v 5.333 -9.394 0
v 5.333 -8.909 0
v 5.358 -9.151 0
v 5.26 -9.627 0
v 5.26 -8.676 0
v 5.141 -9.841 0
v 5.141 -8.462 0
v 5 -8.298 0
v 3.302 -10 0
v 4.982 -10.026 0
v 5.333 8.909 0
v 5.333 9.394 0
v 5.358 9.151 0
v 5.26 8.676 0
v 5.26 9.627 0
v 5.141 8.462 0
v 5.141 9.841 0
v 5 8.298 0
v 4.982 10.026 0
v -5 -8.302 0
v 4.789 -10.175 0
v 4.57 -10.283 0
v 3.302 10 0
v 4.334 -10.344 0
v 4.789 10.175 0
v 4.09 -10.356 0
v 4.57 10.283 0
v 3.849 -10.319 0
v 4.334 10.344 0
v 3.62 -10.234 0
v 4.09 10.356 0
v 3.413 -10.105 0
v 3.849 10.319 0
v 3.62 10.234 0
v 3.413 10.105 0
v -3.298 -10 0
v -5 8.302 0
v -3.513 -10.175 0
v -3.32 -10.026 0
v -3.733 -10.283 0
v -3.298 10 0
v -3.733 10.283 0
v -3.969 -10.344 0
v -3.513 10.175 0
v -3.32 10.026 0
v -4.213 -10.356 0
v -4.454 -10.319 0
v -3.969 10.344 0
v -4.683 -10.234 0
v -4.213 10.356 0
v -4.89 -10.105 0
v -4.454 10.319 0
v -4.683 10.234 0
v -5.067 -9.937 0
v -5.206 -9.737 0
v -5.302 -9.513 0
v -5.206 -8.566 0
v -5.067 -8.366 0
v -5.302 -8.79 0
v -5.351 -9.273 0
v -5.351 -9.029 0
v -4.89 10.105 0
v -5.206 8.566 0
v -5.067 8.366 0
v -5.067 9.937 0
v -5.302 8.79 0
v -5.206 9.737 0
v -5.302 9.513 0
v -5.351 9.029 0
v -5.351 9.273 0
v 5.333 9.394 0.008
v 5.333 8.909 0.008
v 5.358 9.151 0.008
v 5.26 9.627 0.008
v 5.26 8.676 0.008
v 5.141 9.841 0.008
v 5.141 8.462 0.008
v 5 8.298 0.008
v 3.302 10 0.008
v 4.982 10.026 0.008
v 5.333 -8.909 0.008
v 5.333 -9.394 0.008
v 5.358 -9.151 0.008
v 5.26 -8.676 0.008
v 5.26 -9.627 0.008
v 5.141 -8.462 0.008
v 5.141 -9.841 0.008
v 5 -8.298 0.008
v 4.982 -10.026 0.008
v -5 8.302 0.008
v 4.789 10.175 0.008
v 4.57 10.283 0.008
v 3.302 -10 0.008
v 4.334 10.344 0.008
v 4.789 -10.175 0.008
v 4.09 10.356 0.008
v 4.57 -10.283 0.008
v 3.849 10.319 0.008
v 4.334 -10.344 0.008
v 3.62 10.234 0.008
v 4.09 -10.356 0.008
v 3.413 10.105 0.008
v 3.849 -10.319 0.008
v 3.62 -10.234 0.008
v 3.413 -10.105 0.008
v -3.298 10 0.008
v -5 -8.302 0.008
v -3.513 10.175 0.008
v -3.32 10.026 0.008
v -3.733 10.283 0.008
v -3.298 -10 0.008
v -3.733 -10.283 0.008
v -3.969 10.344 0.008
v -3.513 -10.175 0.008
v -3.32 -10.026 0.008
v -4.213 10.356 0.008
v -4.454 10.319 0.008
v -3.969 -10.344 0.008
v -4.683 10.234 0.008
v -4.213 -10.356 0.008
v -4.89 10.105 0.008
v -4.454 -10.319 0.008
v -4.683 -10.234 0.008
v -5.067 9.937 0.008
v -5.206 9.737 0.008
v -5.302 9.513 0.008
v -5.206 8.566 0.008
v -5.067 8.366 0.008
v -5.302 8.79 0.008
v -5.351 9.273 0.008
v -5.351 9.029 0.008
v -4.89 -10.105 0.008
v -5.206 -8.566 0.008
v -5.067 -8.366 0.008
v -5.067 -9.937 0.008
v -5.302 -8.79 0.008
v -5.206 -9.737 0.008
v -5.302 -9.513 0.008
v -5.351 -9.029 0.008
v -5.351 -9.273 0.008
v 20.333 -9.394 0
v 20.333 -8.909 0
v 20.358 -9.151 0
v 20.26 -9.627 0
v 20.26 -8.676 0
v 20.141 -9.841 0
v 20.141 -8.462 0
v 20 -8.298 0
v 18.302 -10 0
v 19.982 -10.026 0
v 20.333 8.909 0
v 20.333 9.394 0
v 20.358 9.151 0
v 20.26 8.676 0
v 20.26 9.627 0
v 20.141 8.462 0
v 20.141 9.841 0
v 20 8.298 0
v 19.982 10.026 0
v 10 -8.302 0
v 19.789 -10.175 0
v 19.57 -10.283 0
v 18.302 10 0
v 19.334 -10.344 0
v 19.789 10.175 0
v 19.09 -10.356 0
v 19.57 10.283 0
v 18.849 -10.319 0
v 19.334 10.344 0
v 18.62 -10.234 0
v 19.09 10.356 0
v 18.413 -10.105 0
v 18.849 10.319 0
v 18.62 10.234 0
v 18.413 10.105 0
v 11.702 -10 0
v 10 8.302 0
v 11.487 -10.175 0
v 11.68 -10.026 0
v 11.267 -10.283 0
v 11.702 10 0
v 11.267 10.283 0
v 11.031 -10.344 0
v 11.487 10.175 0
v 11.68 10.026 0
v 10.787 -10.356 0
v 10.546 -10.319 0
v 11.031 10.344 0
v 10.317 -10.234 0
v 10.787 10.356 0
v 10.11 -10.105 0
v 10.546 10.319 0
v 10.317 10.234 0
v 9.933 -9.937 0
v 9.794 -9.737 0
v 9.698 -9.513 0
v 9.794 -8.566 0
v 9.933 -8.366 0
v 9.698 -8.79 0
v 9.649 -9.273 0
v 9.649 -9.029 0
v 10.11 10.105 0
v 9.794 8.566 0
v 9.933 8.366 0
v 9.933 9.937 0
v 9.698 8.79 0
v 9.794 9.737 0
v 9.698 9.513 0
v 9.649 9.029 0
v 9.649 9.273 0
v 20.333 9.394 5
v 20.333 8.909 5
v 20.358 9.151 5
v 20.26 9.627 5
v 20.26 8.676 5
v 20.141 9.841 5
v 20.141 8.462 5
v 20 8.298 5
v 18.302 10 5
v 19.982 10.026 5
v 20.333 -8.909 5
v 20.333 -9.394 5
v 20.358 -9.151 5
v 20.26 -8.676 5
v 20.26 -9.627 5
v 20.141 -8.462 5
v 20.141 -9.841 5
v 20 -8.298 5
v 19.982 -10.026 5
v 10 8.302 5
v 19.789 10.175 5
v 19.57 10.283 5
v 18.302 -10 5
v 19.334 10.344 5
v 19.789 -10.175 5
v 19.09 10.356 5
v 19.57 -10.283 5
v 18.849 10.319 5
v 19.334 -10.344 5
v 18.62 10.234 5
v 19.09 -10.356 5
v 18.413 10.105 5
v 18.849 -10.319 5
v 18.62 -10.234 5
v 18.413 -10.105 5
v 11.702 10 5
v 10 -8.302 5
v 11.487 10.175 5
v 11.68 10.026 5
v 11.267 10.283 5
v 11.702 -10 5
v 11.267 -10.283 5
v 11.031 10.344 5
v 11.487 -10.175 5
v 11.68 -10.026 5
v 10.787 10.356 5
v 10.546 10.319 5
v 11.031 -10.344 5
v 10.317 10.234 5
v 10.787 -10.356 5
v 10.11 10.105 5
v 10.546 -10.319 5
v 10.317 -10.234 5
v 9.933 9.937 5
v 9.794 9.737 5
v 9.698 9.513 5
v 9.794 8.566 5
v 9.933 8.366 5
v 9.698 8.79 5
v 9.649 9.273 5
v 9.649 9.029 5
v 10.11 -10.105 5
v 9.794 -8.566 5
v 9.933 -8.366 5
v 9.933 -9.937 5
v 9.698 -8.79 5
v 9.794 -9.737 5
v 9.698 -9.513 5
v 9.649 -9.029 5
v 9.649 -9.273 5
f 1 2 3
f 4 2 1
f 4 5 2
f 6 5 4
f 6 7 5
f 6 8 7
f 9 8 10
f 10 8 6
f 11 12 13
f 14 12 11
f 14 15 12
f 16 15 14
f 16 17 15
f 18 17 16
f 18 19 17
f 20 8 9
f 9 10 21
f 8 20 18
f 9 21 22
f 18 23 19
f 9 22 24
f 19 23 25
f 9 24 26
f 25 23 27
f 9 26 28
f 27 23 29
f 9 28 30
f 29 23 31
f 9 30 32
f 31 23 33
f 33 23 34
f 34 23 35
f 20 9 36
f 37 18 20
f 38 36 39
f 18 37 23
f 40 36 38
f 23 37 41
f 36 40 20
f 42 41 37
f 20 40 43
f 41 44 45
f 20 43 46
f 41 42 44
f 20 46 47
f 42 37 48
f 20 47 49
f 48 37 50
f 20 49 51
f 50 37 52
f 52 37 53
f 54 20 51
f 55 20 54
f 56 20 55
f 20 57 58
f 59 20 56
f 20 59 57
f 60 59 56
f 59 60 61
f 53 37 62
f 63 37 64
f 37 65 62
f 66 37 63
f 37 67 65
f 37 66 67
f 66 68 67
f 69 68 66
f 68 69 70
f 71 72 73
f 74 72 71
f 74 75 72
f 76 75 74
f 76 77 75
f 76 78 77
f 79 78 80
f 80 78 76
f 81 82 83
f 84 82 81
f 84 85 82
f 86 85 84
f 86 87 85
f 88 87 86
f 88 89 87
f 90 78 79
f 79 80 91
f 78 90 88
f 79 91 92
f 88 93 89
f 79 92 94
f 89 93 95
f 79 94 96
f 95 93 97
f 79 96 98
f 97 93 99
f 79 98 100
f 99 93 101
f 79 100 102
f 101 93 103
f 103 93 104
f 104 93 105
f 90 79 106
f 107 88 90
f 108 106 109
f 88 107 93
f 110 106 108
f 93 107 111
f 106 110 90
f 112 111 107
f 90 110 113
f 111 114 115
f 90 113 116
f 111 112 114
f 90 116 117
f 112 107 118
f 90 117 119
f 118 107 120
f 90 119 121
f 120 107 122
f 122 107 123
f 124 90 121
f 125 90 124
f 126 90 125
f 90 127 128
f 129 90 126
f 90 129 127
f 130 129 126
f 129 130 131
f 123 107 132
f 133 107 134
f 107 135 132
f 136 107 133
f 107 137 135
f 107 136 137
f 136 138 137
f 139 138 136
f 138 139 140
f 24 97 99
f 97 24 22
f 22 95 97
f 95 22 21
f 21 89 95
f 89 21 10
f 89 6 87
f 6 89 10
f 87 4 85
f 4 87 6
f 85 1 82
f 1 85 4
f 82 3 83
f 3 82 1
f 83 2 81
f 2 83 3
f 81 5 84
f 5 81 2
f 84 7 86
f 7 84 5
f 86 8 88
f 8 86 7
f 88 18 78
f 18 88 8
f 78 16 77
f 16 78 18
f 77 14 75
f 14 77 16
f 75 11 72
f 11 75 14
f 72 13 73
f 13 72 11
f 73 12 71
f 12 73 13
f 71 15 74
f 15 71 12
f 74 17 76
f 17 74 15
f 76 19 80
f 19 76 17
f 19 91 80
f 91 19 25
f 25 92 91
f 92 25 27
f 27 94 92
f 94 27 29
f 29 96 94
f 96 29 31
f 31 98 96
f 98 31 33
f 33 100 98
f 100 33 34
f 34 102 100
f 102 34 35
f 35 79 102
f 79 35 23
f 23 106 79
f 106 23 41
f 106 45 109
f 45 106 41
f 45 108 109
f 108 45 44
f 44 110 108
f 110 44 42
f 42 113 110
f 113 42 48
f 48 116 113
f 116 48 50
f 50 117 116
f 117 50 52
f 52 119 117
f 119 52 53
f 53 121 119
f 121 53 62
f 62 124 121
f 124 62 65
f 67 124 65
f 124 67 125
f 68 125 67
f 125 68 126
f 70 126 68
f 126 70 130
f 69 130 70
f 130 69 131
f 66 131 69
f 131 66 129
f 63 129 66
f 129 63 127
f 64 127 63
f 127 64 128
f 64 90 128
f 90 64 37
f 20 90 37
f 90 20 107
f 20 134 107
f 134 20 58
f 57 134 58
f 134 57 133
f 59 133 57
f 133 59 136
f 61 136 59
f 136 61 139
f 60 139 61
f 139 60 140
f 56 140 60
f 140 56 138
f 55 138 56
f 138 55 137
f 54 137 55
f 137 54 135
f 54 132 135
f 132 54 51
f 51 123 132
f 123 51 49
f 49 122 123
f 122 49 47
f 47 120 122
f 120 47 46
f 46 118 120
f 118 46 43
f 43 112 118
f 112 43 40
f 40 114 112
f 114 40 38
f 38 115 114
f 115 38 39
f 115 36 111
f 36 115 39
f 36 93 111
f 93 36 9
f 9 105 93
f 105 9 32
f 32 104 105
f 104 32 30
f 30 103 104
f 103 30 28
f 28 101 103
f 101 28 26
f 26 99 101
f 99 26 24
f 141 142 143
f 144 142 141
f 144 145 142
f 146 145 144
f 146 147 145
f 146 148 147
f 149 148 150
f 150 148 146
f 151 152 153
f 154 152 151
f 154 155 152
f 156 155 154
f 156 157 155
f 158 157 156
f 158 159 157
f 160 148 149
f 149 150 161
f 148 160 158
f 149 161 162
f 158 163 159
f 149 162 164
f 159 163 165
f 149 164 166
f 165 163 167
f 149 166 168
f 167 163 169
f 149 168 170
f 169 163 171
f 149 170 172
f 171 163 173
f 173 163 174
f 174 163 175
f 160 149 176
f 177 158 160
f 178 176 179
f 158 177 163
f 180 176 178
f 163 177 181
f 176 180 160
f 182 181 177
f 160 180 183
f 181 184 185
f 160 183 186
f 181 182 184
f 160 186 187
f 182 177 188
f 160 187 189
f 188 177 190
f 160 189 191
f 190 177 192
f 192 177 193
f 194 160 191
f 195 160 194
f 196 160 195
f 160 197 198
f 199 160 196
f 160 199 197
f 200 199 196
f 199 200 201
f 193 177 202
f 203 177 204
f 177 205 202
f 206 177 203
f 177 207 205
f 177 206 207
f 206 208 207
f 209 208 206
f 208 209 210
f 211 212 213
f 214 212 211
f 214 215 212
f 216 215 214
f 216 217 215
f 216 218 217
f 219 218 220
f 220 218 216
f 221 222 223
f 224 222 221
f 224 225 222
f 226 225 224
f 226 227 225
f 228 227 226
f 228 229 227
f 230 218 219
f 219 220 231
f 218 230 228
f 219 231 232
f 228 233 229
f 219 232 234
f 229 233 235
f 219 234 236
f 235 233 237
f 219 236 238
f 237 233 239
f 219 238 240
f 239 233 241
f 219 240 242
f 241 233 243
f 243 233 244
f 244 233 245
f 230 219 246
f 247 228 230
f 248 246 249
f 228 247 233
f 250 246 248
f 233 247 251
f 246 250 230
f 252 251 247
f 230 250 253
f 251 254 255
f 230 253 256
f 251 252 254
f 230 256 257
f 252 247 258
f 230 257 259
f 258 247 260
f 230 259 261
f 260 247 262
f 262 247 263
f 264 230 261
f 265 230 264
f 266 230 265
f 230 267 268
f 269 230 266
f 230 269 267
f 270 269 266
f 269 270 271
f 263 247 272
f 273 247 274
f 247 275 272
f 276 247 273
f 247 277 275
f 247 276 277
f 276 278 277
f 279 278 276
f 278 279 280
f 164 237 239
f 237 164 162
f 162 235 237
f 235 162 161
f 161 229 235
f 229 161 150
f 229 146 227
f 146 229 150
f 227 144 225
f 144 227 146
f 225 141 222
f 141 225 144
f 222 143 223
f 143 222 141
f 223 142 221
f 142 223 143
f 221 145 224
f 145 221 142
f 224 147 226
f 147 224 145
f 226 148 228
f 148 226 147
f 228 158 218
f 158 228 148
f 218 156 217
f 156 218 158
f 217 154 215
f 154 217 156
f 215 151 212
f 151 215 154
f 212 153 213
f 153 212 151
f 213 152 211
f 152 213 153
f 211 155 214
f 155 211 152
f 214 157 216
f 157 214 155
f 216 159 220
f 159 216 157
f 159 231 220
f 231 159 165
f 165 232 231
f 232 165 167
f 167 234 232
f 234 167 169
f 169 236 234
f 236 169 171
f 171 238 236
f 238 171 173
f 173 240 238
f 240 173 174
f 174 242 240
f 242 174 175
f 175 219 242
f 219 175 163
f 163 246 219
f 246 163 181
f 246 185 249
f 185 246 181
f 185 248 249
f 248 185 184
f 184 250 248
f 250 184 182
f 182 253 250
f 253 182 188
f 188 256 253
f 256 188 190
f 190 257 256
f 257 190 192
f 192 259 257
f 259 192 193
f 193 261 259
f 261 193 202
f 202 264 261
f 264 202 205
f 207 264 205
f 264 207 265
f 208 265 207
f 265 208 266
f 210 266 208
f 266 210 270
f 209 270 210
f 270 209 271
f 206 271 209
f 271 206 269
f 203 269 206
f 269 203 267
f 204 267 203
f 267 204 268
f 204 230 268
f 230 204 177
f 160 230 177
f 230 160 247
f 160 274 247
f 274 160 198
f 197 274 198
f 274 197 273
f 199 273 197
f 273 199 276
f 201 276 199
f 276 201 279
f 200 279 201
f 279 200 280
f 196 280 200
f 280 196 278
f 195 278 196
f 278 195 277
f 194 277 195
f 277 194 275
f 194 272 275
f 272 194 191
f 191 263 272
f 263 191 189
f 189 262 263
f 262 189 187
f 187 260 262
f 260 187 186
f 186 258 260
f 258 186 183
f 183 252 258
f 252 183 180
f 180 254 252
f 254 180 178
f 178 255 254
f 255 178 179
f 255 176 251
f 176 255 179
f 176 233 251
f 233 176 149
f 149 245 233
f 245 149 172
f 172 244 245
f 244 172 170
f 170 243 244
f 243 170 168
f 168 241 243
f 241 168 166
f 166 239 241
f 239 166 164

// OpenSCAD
// file: ../utils/core/clip.scad
//
// NopSCADlib Copyright Chris Palmer 2018
// nop.head@gmail.com
// hydraraptor.blogspot.com
//
// This file is part of NopSCADlib.
//
// NopSCADlib is free software: you can redistribute it and/or modify it under the terms of the
// GNU General Public License as published by the Free Software Foundation, either version 3 of
// the License, or (at your option) any later version.
//
// NopSCADlib is distributed in the hope that it will be useful, but WITHOUT ANY WARRANTY;
// without even the implied warranty of MERCHANTABILITY or FITNESS FOR A PARTICULAR PURPOSE.
// See the GNU General Public License for more details.
//
// You should have received a copy of the GNU General Public License along with NopSCADlib.
// If not, see <https://www.gnu.org/licenses/>.
//

//
//! Construct arbirarily large box to partition 3D space and clip objects, useful for creating cross sections to see the inside when debugging.
//!
//! Original version by Doug Moen on the OpenSCAD forum
//
//
module box(xmin, ymin, zmin, xmax, ymax, zmax) //! Construct a box given its bounds
    polyhedron(
        [[xmin, ymin, zmin],  // 0
         [xmin, ymin, zmax],  // 1
         [xmin, ymax, zmin],  // 2
         [xmin, ymax, zmax],  // 3
         [xmax, ymin, zmin],  // 4
         [xmax, ymin, zmax],  // 5
         [xmax, ymax, zmin],  // 6
         [xmax, ymax, zmax]], // 7
        [[7,5,1,3],  // top
         [2,0,4,6],  // bottom
         [5,4,0,1],  // front
         [3,2,6,7],  // back
         [5,7,6,4],  // right
         [0,2,3,1]]  // left
    );

module clip(xmin = -inf, ymin = -inf, zmin = -inf, xmax = inf, ymax = inf, zmax = inf) //! Clip child to specified boundaries
    render() intersection() {
        children();

        box(xmin, ymin, zmin, xmax, ymax, zmax);
    }
// file: ../utils/core/rounded_rectangle.scad
//
// NopSCADlib Copyright Chris Palmer 2018
// nop.head@gmail.com
// hydraraptor.blogspot.com
//
// This file is part of NopSCADlib.
//
// NopSCADlib is free software: you can redistribute it and/or modify it under the terms of the
// GNU General Public License as published by the Free Software Foundation, either version 3 of
// the License, or (at your option) any later version.
//
// NopSCADlib is distributed in the hope that it will be useful, but WITHOUT ANY WARRANTY;
// without even the implied warranty of MERCHANTABILITY or FITNESS FOR A PARTICULAR PURPOSE.
// See the GNU General Public License for more details.
//
// You should have received a copy of the GNU General Public License along with NopSCADlib.
// If not, see <https://www.gnu.org/licenses/>.
//

//
//! Rectangle with rounded corners.
//
module rounded_square(size, r, center = true) //! Like ```square()``` but with with rounded corners
{
    $fn = r2sides4n(r);
    offset(r) offset(-r) square(size, center = center);
}

module rounded_rectangle(size, r, center = true, xy_center = true) //! Like ```cube()``` but corners rounded in XY plane and separate centre options for xy and z.
{
    linear_extrude(size[2], center = center)
        rounded_square([size[0], size[1]], r, xy_center);
}
// file: ../utils/core/teardrops.scad
//
// NopSCADlib Copyright Chris Palmer 2018
// nop.head@gmail.com
// hydraraptor.blogspot.com
//
// This file is part of NopSCADlib.
//
// NopSCADlib is free software: you can redistribute it and/or modify it under the terms of the
// GNU General Public License as published by the Free Software Foundation, either version 3 of
// the License, or (at your option) any later version.
//
// NopSCADlib is distributed in the hope that it will be useful, but WITHOUT ANY WARRANTY;
// without even the implied warranty of MERCHANTABILITY or FITNESS FOR A PARTICULAR PURPOSE.
// See the GNU General Public License for more details.
//
// You should have received a copy of the GNU General Public License along with NopSCADlib.
// If not, see <https://www.gnu.org/licenses/>.
//

//
//! For making horizontal holes that don't need support material.
//! Small holes can get away without it, but they print better with truncated teardrops.
//
module teardrop(h, r, center = true, truncate = true, chamfer = 0) { //! For making horizontal holes that don't need support material, set ```truncate = false``` to make traditional RepRap teardrops that don't even need bridging
    module teardrop_2d(r, truncate) {
        hull() {
            circle4n(r);
            if(truncate)
                translate([0, r / 2])
                    square([2 * r * (sqrt(2) - 1), r], center = true);
            else
                polygon([[0, 0], [eps, 0], [0, r * sqrt(2)]]);
        }
    }

    render(convexity = 5)
        extrude_if(h, center)
            teardrop_2d(r, truncate);

    teardrop_chamfer(h, center, chamfer) {
        linear_extrude(eps, center = true)
            teardrop_2d(r + chamfer / 2, truncate);
        translate_z(-chamfer / 2)
            linear_extrude(eps, center = true)
                teardrop_2d(r, truncate);
    }
}

module semi_teardrop(h, r, d = undef, center = true, chamfer = 0) { //! A semi teardrop in the positive Y domain
    module semi_teardrop_2d(r, d) {
        intersection() {
            R = is_undef(d) ? r : d / 2;
            teardrop(r = R, h = 0);

            sq = R + 1;
            translate([-sq, 0])
                square([2 * sq, sq]);
        }
    }

    render(convexity = 5)
        extrude_if(h, center)
            semi_teardrop_2d(r, d);

    teardrop_chamfer(h, center, chamfer) {
        linear_extrude(eps, center = true)
            semi_teardrop_2d(r + chamfer / 2, d);
        translate_z(-chamfer / 2)
            linear_extrude(eps, center = true)
                semi_teardrop_2d(r, d);
    }
}

module teardrop_plus(h, r, center = true, truncate = true, chamfer = 0) //! Slightly bigger teardrop to allow for the 3D printing staircase effect
    teardrop(h, r + layer_height / 4, center, truncate, chamfer);

module tearslot(h, r, w, center = true, chamfer = 0) { //! A horizontal slot that doesn't need support material
    module tearslot_2d(r, w) {
        hull() {
            translate([-w / 2, 0]) teardrop(r = r, h = 0);
            translate([w / 2, 0]) teardrop(r = r, h = 0);
        }
    }

    extrude_if(h, center)
        tearslot_2d(r, w);

    teardrop_chamfer(h, center, chamfer) {
        linear_extrude(eps, center = true)
            tearslot_2d(r + chamfer / 2, w);
        translate_z(-chamfer / 2)
            linear_extrude(eps, center = true)
                tearslot_2d(r, w);
    }
}

module vertical_tearslot(h, r, l, center = true, chamfer = 0) { //! A vertical slot that doesn't need support material
    module vertical_tearslot_2d(r, l) {
        hull() {
            translate([0,  l / 2]) teardrop(0, r, true);
            translate([0, -l / 2]) circle4n(r);
        }
    }

    extrude_if(h, center)
        vertical_tearslot_2d(r, l);

    teardrop_chamfer(h, center, chamfer) {
        linear_extrude(eps, center = true)
            vertical_tearslot_2d(r + chamfer / 2, l);
        translate_z(-chamfer / 2)
            linear_extrude(eps, center = true)
                vertical_tearslot_2d(r, l);
    }
}

module teardrop_chamfer(h, center, chamfer) { //! Helper module for adding chamfer to a teardrop
    if(h && chamfer)
        translate_z(center ? 0 : h / 2)
            for(m = [0, 1])
                mirror([0, 0, m])
                    translate_z((h - eps ) / 2)
                        hull()
                            children();
}
// file: ../utils/core/polyholes.scad
//
// NopSCADlib Copyright Chris Palmer 2018
// nop.head@gmail.com
// hydraraptor.blogspot.com
//
// This file is part of NopSCADlib.
//
// NopSCADlib is free software: you can redistribute it and/or modify it under the terms of the
// GNU General Public License as published by the Free Software Foundation, either version 3 of
// the License, or (at your option) any later version.
//
// NopSCADlib is distributed in the hope that it will be useful, but WITHOUT ANY WARRANTY;
// without even the implied warranty of MERCHANTABILITY or FITNESS FOR A PARTICULAR PURPOSE.
// See the GNU General Public License for more details.
//
// You should have received a copy of the GNU General Public License along with NopSCADlib.
// If not, see <https://www.gnu.org/licenses/>.
//

//
//! A method of making 3D printed holes come out the right size regardless of the printer, providing
//! it gets the linear dimensions right. See <https://hydraraptor.blogspot.com/2011/02/polyholes.html>
//!
//! The module provides `poly_circle()`, `poly_cylinder()` and `poly_ring()` that is useful for making printed washers and pillars.
//
function sides(r) = max(round(4 * r), 3);                                       //! Optimium number of sides for specified radius
function corrected_radius(r, n = 0)   = r / cos(180 / (n ? n : sides(r)));      //! Adjusted radius to make flats lie on the circle
function corrected_diameter(d, n = 0) = d / cos(180 / (n ? n : sides(d / 2)));  //! Adjusted diameter to make flats lie on the circle

module poly_circle(r, sides = 0) { //! Make a circle adjusted to print the correct size
    n = sides ? sides : sides(r);
    circle(r = corrected_radius(r,n), $fn = n);
}

module poly_cylinder(r, h, center = false, sides = 0) //! Make a cylinder adjusted to print the correct size
    extrude_if(h, center)
        poly_circle(r, sides);

module poly_ring(or, ir) { //! Make a 2D ring adjusted to have the correct internal radius
    cir = corrected_radius(ir);
    filaments = (or - cir) / extrusion_width;
    if(filaments > 3 + eps)
        difference() {
            circle(or);

            poly_circle(ir);
        }
    else
        if(filaments >= 2)
            difference() {
                offset(or - cir)
                    poly_circle(ir);

                poly_circle(ir);
            }
            else
                difference() {
                    poly_circle(or);

                    offset(-squeezed_wall)
                        poly_circle(or);
                }
}

module poly_tube(or, ir, h, center = false) //! Make a tube adjusted to have the correct internal radius
    extrude_if(h, center)
        poly_ring(or, ir);

module drill(r, h = 100) //! Make a cylinder for drilling holes suitable for CNC routing, set h = 0 for circle
    extrude_if(h)
        circle(r = corrected_radius(r, r2sides(r)));
//
// Horizontal slot
//
module slot(r, l, h = 100) //! Make a horizontal slot suitable for CNC routing, set h = 0 for 2D version
    extrude_if(h)
        hull() {
            translate([l / 2,0])
                drill(r, 0);

            translate([-l / 2,0])
                drill(r, 0);
        }
// file: ../utils/core/bom.scad
//
// NopSCADlib Copyright Chris Palmer 2018
// nop.head@gmail.com
// hydraraptor.blogspot.com
//
// This file is part of NopSCADlib.
//
// NopSCADlib is free software: you can redistribute it and/or modify it under the terms of the
// GNU General Public License as published by the Free Software Foundation, either version 3 of
// the License, or (at your option) any later version.
//
// NopSCADlib is distributed in the hope that it will be useful, but WITHOUT ANY WARRANTY;
// without even the implied warranty of MERCHANTABILITY or FITNESS FOR A PARTICULAR PURPOSE.
// See the GNU General Public License for more details.
//
// You should have received a copy of the GNU General Public License along with NopSCADlib.
// If not, see <https://www.gnu.org/licenses/>.
//

//
//! Bill Of Materials generation via echo and the ```bom.py``` script. Also handles exploded assembly views and posing. Assembly instructions can precede the module
//! definition that makes the assembly.
//!
//! The example below shows how to define a vitamin and incorporate it into an assembly with sub-assemblies and make an exploded view. The resulting flat BOM is shown but
//! heirachical BOMs are also generated for real projects.
//
function bom_mode(n = 1) = $_bom >= n && (is_undef($on_bom) || $on_bom);  //! Current BOM mode, 0 = none, 1 = printed and routed parts and assemblies, 2 includes vitamins as well
function exploded() = is_undef($exploded_parent) ? $exploded : 0;   //! Returns the value of ```$exploded``` if it is defined, else ```0```
function show_supports() = !$preview || exploded();                 //! True if printed support material should be shown

module no_explode() let($exploded_parent = true) children();        //! Prevent children being exploded
module no_pose() let($posed = true) children();                     //! Force children not to be posed even if parent is

module explode(d, explode_children = false, offset = [0,0,0]) {     //! Explode children by specified Z distance or vector ```d```, option to explode grand children
    v = is_list(d) ? d : [0, 0, d];
    o = is_list(offset) ? offset : [0, 0, offset];
    if($exploded && is_undef($exploded_parent) && norm(v)) {
        translate(o)                                                // Draw the line first in case the child is transparent
            color("yellow") hull() {
                sphere(0.2);

                translate(v * $exploded)
                    sphere(0.2);
            }

        translate(v * $exploded)
            let($exploded_parent = explode_children ? undef : true)
                children();
    }
    else
        children();
}

module pose(a = [55, 0, 25], t = [0, 0, 0], exploded = undef)       //! Pose an STL or assembly for rendering to png by specifying rotation ```a``` and translation ```t```, ```exploded = true for``` just the exploded view or ```false``` for unexploded only.
    if(is_undef($pose) || !is_undef($posed) || (!is_undef(exploded) && exploded != !!exploded()))
        children();
    else
        let($posed = true) // only pose the top level
            rotate([55, 0, 25])
                rotate([-a.x, 0, 0])
                    rotate([0, -a.y, 0])
                        rotate([0, 0, -a.z])
                            translate(-t)
                                children();

module pose_hflip(exploded = undef)       //! Pose an STL or assembly for rendering to png by flipping around the Y axis, ```exploded = true for``` just the exploded view or ```false``` for unexploded only.
    if(is_undef($pose) || !is_undef($posed) || (!is_undef(exploded) && exploded != !!exploded()))
        children();
    else
        let($posed = true) // only pose the top level
            hflip()
                children();

module pose_vflip(exploded = undef)       //! Pose an STL or assembly for rendering to png by flipping around the X axis, ```exploded = true for``` just the exploded view or ```false``` for unexploded only.
    if(is_undef($pose) || !is_undef($posed) || (!is_undef(exploded) && exploded != !!exploded()))
        children();
    else
        let($posed = true) // only pose the top level
            vflip()
                children();


module assembly(name) {                 //! Name an assembly that will appear on the BOM, there needs to a module named ```<name>_assembly``` to make it
    if(bom_mode())
        echo(str("~", name, "_assembly{"));

    no_pose()
        if(is_undef($child_assembly))
            let($child_assembly = true)
                children();
        else
            no_explode()
                children();

    if(bom_mode())
        echo(str("~}", name, "_assembly"));
}

module stl(name) {                      //! Name an stl that will appear on the BOM, there needs to a module named ```<name>_stl``` to make it
    if(bom_mode())
        echo(str("~", name, ".stl"));
}

module dxf(name) {                      //! Name a dxf that will appear on the BOM, there needs to a module named ```<name>_dxf``` to make it
    if(bom_mode())
        echo(str("~", name, ".dxf"));
}

function value_string(value) = is_string(value) ? str("\"", value, "\"") : str(value); //! Convert ```value``` to a string or quote it if it is already a string

function arg(value, default, name = "") =   //! Create string for arg if not default, helper for ```vitamin()```
    value == default ? ""
                     : name ? str(", ", name, " = ", value_string(value))
                            : str(", ", value_string(value));

module vitamin(description) {                //! Describe a vitamin for the BOM entry and precede it with a module call that creates it, eg. "wigit(42): Type 42 widget"
    if(bom_mode(2))
        echo(str("~", description, !is_undef($hidden) ? " - not shown" : ""));
}

module not_on_bom(on = false)               //! Specify the following child parts are not on the BOM, for example when they are on a PCB that comes assembled
    let($on_bom = on)
        children();

module hidden()                             //! Make item invisible, except on the BOM
    scale(1 / sqr(1024))
        let($hidden = true)
            children();
// file: ../utils/core/sphere.scad
//
// NopSCADlib Copyright Chris Palmer 2018
// nop.head@gmail.com
// hydraraptor.blogspot.com
//
// This file is part of NopSCADlib.
//
// NopSCADlib is free software: you can redistribute it and/or modify it under the terms of the
// GNU General Public License as published by the Free Software Foundation, either version 3 of
// the License, or (at your option) any later version.
//
// NopSCADlib is distributed in the hope that it will be useful, but WITHOUT ANY WARRANTY;
// without even the implied warranty of MERCHANTABILITY or FITNESS FOR A PARTICULAR PURPOSE.
// See the GNU General Public License for more details.
//
// You should have received a copy of the GNU General Public License along with NopSCADlib.
// If not, see <https://www.gnu.org/licenses/>.
//

//! Redefines `sphere()` to always have a vertex on all six half axes I.e. vertices at the poles and the equator and `$fn` a multiple of four.
//! This ensures `hull` and `minkowski` results have the correct dimensions when spheres are placed at the corners.

module sphere(r = 1, d = undef) {                   //! Override ```sphere``` so that has vertices on all three axes. Has the advantage of giving correct dimensions when hulled
    R = is_undef(d) ? r : d / 2;
    rotate_extrude($fn = r2sides4n(R))
        rotate(-90)
            semi_circle(R);
}
// file: ../utils/core/global.scad
//
// NopSCADlib Copyright Chris Palmer 2018
// nop.head@gmail.com
// hydraraptor.blogspot.com
//
// This file is part of NopSCADlib.
//
// NopSCADlib is free software: you can redistribute it and/or modify it under the terms of the
// GNU General Public License as published by the Free Software Foundation, either version 3 of
// the License, or (at your option) any later version.
//
// NopSCADlib is distributed in the hope that it will be useful, but WITHOUT ANY WARRANTY;
// without even the implied warranty of MERCHANTABILITY or FITNESS FOR A PARTICULAR PURPOSE.
// See the GNU General Public License for more details.
//
// You should have received a copy of the GNU General Public License along with NopSCADlib.
// If not, see <https://www.gnu.org/licenses/>.
//

//
//! Global constants, functions and modules. This file is used directly or indirectly in every scad file.
//
include <../../global_defs.scad>

function inch(x) = x * 25.4;                                                        //! Inch to mm conversion (For fractional inches, 'inch(1 + 7/8)' will work as expected.)
function foot(x) = x * 25.4 * 12;                                                   //! Foot to mm conversion
function yard(x) = x * 25.4 * 12 * 3;                                               //! Yard to mm conversion
function mm(x)   = x;                                                               //! Explicit mm specified
function cm(x)   = x * 10.0;                                                        //! cm to mm conversion
function m(x)    = x * 1000.0;                                                      //! m to mm conversion

function sqr(x) = x * x;                                                            //! Returns the square of ```x```
function echoit(x) = echo(x) x;                                                     //! Echo expression and return it, useful for debugging
function in(list, x) = !!len([for(v = list) if(v == x) true]);                      //! Returns true if ```x``` is an element in the ```list```
function Len(x) = is_list(x) ? len(x) : 0;                                          //! Returns the length of a list or 0 if ```x``` is not a list
function r2sides(r) = $fn ? $fn : ceil(max(min(360/ $fa, r * 2 * PI / $fs), 5));    //! Replicates the OpenSCAD logic to calculate the number of sides from the radius
function r2sides4n(r) = floor((r2sides(r) + 3) / 4) * 4;                            //! Round up the number of sides to a multiple of 4 to ensure points land on all axes

module translate_z(z) translate([0, 0, z]) children();                              //! Shortcut for Z only translations
module vflip() rotate([180, 0, 0]) children();                                      //! Invert children by doing a 180&deg; flip around the X axis
module hflip() rotate([0, 180, 0]) children();                                      //! Invert children by doing a 180&deg; flip around the Y axis
module ellipse(xr, yr) scale([1, yr / xr]) circle4n(xr);                            //! Draw an ellipse

module extrude_if(h, center = true)                 //! Extrudes 2D object to 3D when ```h``` is nonzero, otherwise leaves it 2D
    if(h)
        linear_extrude(h, center = center, convexity = 2) // 3D
            children();
    else
        children();                                 // 2D

module circle4n(r, d = undef) {                     //! Circle with multiple of 4 vertices
    R = is_undef(d) ? r : d / 2;
    circle(R, $fn = r2sides4n(R));
}

module semi_circle(r, d = undef)                    //! A semi circle in the positive Y domain
    intersection() {
        R = is_undef(d) ? r : d / 2;
        circle4n(R);

        sq = R + 1;
        translate([-sq, 0])
            square([2 * sq, sq]);
    }

module right_triangle(width, height, h, center = true) //! A right angled triangle with the 90&deg; corner at the origin. 3D when ```h``` is nonzero, otherwise 2D
    extrude_if(h, center = center)
        polygon(points = [[0,0], [width, 0], [0, height]]);

include <sphere.scad>
include <bom.scad>
include <polyholes.scad>
include <teardrops.scad>
include <rounded_rectangle.scad>
include <clip.scad>
// file: ../utils/core/core.scad
//
// NopSCADlib Copyright Chris Palmer 2018
// nop.head@gmail.com
// hydraraptor.blogspot.com
//
// This file is part of NopSCADlib.
//
// NopSCADlib is free software: you can redistribute it and/or modify it under the terms of the
// GNU General Public License as published by the Free Software Foundation, either version 3 of
// the License, or (at your option) any later version.
//
// NopSCADlib is distributed in the hope that it will be useful, but WITHOUT ANY WARRANTY;
// without even the implied warranty of MERCHANTABILITY or FITNESS FOR A PARTICULAR PURPOSE.
// See the GNU General Public License for more details.
//
// You should have received a copy of the GNU General Public License along with NopSCADlib.
// If not, see <https://www.gnu.org/licenses/>.
//

//
// Include this file to use the miniumum library
//
include <../../global_defs.scad>
//
// Global functions and modules
//
use <global.scad>

module use_stl(name) {               //! Import an STL to make a build platter
    stl(name);

    import(str("../stls/", name, ".stl"));
}

module use_dxf(name) {               //! Import a DXF to make a build panel
    dxf(name);

    import(str("../dxfs/", name, ".dxf"));
}
// file: ../utils/dogbones.scad
//
// NopSCADlib Copyright Chris Palmer 2018
// nop.head@gmail.com
// hydraraptor.blogspot.com
//
// This file is part of NopSCADlib.
//
// NopSCADlib is free software: you can redistribute it and/or modify it under the terms of the
// GNU General Public License as published by the Free Software Foundation, either version 3 of
// the License, or (at your option) any later version.
//
// NopSCADlib is distributed in the hope that it will be useful, but WITHOUT ANY WARRANTY;
// without even the implied warranty of MERCHANTABILITY or FITNESS FOR A PARTICULAR PURPOSE.
// See the GNU General Public License for more details.
//
// You should have received a copy of the GNU General Public License along with NopSCADlib.
// If not, see <https://www.gnu.org/licenses/>.
//

//
//! When square holes are cut with a CNC bit they get rounded corners. If it is important that
//! a square cornered part fits in the hole then circles are placed in the corners making a bone shape.
//
include <../utils/core/core.scad>

module dogbone_square(size, r = cnc_bit_r, center = true) //! Square with circles at the corners
{
    union() {
        square(size, center = center);

        if(r > 0) {
            origin = center ? [0, 0] : size / 2;
            offset = r / sqrt(2);

            for(x = [-1, 1], y = [-1, 1])
                translate(origin + [x * (size.x / 2 - offset), y * (size.y / 2 - offset)])
                    drill(r, 0);
        }
    }
}

module dogbone_rectangle(size, r = cnc_bit_r, center = true, xy_center = true) //! Rectangle with cylinders at the corners
{
    extrude_if(h = size.z, center = center)
        dogbone_square([size.x, size.y], r, xy_center);
}
// file: ../global_defs.scad
//
// NopSCADlib Copyright Chris Palmer 2018
// nop.head@gmail.com
// hydraraptor.blogspot.com
//
// This file is part of NopSCADlib.
//
// NopSCADlib is free software: you can redistribute it and/or modify it under the terms of the
// GNU General Public License as published by the Free Software Foundation, either version 3 of
// the License, or (at your option) any later version.
//
// NopSCADlib is distributed in the hope that it will be useful, but WITHOUT ANY WARRANTY;
// without even the implied warranty of MERCHANTABILITY or FITNESS FOR A PARTICULAR PURPOSE.
// See the GNU General Public License for more details.
//
// You should have received a copy of the GNU General Public License along with NopSCADlib.
// If not, see <https://www.gnu.org/licenses/>.
//

//
// This file included directly or indirectly in every scad file.
//
// This scheme allows the following:
//  bom defaults to 0
//  Setting $bom on the command line or in the main file before including lib.scad overrides it everywhere.
//  Setting $bom after including lib overrides bom in the libs but not in the local file.
//  Setting $_bom in the local file overrides it in the local file but not in the libs.
//
//function is_undef(x) = x == undef;

$_bom           = is_undef($bom)             ? 0      : $bom;             // 0 no bom, 1 assemblies and stls, 2 vitamins as well
$exploded       = is_undef($explode)         ? 0      : $explode;         // 1 for exploded view
layer_height    = is_undef($layer_height)    ? 0.25   : $layer_height;    // layer heigth when printing
extrusion_width = is_undef($extrusion_width) ? 0.5    : $extrusion_width; // filament width when printing
nozzle          = is_undef($nozzle)          ? 0.45   : $nozzle;          // 3D printer nozzle
cnc_bit_r       = is_undef($cnc_bit_r)       ? 1.2    : $cnc_bit_r;       // miniumum tool radius when milling 2D objects
pp1_colour      = is_undef($pp1_colour)      ? [0, 146/255, 0] : $pp1_colour; // printed part colour 1, RepRap logo colour
pp2_colour      = is_undef($pp2_colour)      ? "red"  : $pp2_colour;      // printed part colour 2
pp3_colour      = is_undef($pp3_colour)      ? "blue" : $pp3_colour;      // printed part colour 3
pp4_colour      = is_undef($pp4_colour)      ? "darkorange" : $pp4_colour;// printed part colour 4
show_rays       = is_undef($show_rays)       ? false  : $show_rays;       // show camera sight lines and light direction
show_threads    = is_undef($show_threads)    ? false  : $show_threads;    // show screw threads

// Minimum wall is about two filaments wide but we extrude it closer to get better bonding
squeezed_wall = $preview ? 2 * extrusion_width - layer_height * (1 - PI / 4)
                         : extrusion_width - layer_height / 2 + nozzle / 2 + extrusion_width / 2;

inf = 1e10;      // very big
eps = 1/128;     // small fudge factor to stop CSG barfing on coincident faces.
$fa = 6;
$fs = extrusion_width / 2;

function round_to_layer(z) = ceil(z / layer_height) * layer_height;
// Some additional named colors
grey20                          = [0.2, 0.2, 0.2];
grey30                          = [0.3, 0.3, 0.3];
grey40                          = [0.4, 0.4, 0.4];
grey50                          = [0.5, 0.5, 0.5];
grey60                          = [0.6, 0.6, 0.6];
grey70                          = [0.7, 0.7, 0.7];
grey80                          = [0.8, 0.8, 0.8];
grey90                          = [0.9, 0.9, 0.9];
gold                            = [255/255, 215/255, 0/255];
brass                           = [255/255, 220/255, 100/255];
silver                          = [0.75, 0.75, 0.75];

/*
 * Enums
 */
//
// Screws
//
hs_cap    = 0;
hs_pan    = 1;
hs_cs     = 2;     // counter sunk
hs_hex    = 3;
hs_grub   = 4;     // pulley set screw
hs_cs_cap = 5;
hs_dome   = 6;
//
// Hot end descriptions
//
jhead   = 1;
e3d     = 2;
//
// Face enumeration
//
f_bottom = 0;
f_top    = 1;
f_left   = 2;
f_right  = 3;
f_front  = 4;
f_back   = 5;
// main file
//
// NopSCADlib Copyright Chris Palmer 2018
// nop.head@gmail.com
// hydraraptor.blogspot.com
//
// This file is part of NopSCADlib.
//
// NopSCADlib is free software: you can redistribute it and/or modify it under the terms of the
// GNU General Public License as published by the Free Software Foundation, either version 3 of
// the License, or (at your option) any later version.
//
// NopSCADlib is distributed in the hope that it will be useful, but WITHOUT ANY WARRANTY;
// without even the implied warranty of MERCHANTABILITY or FITNESS FOR A PARTICULAR PURPOSE.
// See the GNU General Public License for more details.
//
// You should have received a copy of the GNU General Public License along with NopSCADlib.
// If not, see <https://www.gnu.org/licenses/>.
//
include <../global_defs.scad>
use <../utils/dogbones.scad>

module dogbones() {
    #linear_extrude(eps)
        dogbone_square([10, 20]);

    #translate([15, 0])
        dogbone_rectangle([10, 20, 5], center = false);

    sq = 3;
    translate([-5 + sq / 2 + eps, -10 + sq / 2 + eps])
        %cube([sq, sq, 1], center = true);
}

dogbones();
